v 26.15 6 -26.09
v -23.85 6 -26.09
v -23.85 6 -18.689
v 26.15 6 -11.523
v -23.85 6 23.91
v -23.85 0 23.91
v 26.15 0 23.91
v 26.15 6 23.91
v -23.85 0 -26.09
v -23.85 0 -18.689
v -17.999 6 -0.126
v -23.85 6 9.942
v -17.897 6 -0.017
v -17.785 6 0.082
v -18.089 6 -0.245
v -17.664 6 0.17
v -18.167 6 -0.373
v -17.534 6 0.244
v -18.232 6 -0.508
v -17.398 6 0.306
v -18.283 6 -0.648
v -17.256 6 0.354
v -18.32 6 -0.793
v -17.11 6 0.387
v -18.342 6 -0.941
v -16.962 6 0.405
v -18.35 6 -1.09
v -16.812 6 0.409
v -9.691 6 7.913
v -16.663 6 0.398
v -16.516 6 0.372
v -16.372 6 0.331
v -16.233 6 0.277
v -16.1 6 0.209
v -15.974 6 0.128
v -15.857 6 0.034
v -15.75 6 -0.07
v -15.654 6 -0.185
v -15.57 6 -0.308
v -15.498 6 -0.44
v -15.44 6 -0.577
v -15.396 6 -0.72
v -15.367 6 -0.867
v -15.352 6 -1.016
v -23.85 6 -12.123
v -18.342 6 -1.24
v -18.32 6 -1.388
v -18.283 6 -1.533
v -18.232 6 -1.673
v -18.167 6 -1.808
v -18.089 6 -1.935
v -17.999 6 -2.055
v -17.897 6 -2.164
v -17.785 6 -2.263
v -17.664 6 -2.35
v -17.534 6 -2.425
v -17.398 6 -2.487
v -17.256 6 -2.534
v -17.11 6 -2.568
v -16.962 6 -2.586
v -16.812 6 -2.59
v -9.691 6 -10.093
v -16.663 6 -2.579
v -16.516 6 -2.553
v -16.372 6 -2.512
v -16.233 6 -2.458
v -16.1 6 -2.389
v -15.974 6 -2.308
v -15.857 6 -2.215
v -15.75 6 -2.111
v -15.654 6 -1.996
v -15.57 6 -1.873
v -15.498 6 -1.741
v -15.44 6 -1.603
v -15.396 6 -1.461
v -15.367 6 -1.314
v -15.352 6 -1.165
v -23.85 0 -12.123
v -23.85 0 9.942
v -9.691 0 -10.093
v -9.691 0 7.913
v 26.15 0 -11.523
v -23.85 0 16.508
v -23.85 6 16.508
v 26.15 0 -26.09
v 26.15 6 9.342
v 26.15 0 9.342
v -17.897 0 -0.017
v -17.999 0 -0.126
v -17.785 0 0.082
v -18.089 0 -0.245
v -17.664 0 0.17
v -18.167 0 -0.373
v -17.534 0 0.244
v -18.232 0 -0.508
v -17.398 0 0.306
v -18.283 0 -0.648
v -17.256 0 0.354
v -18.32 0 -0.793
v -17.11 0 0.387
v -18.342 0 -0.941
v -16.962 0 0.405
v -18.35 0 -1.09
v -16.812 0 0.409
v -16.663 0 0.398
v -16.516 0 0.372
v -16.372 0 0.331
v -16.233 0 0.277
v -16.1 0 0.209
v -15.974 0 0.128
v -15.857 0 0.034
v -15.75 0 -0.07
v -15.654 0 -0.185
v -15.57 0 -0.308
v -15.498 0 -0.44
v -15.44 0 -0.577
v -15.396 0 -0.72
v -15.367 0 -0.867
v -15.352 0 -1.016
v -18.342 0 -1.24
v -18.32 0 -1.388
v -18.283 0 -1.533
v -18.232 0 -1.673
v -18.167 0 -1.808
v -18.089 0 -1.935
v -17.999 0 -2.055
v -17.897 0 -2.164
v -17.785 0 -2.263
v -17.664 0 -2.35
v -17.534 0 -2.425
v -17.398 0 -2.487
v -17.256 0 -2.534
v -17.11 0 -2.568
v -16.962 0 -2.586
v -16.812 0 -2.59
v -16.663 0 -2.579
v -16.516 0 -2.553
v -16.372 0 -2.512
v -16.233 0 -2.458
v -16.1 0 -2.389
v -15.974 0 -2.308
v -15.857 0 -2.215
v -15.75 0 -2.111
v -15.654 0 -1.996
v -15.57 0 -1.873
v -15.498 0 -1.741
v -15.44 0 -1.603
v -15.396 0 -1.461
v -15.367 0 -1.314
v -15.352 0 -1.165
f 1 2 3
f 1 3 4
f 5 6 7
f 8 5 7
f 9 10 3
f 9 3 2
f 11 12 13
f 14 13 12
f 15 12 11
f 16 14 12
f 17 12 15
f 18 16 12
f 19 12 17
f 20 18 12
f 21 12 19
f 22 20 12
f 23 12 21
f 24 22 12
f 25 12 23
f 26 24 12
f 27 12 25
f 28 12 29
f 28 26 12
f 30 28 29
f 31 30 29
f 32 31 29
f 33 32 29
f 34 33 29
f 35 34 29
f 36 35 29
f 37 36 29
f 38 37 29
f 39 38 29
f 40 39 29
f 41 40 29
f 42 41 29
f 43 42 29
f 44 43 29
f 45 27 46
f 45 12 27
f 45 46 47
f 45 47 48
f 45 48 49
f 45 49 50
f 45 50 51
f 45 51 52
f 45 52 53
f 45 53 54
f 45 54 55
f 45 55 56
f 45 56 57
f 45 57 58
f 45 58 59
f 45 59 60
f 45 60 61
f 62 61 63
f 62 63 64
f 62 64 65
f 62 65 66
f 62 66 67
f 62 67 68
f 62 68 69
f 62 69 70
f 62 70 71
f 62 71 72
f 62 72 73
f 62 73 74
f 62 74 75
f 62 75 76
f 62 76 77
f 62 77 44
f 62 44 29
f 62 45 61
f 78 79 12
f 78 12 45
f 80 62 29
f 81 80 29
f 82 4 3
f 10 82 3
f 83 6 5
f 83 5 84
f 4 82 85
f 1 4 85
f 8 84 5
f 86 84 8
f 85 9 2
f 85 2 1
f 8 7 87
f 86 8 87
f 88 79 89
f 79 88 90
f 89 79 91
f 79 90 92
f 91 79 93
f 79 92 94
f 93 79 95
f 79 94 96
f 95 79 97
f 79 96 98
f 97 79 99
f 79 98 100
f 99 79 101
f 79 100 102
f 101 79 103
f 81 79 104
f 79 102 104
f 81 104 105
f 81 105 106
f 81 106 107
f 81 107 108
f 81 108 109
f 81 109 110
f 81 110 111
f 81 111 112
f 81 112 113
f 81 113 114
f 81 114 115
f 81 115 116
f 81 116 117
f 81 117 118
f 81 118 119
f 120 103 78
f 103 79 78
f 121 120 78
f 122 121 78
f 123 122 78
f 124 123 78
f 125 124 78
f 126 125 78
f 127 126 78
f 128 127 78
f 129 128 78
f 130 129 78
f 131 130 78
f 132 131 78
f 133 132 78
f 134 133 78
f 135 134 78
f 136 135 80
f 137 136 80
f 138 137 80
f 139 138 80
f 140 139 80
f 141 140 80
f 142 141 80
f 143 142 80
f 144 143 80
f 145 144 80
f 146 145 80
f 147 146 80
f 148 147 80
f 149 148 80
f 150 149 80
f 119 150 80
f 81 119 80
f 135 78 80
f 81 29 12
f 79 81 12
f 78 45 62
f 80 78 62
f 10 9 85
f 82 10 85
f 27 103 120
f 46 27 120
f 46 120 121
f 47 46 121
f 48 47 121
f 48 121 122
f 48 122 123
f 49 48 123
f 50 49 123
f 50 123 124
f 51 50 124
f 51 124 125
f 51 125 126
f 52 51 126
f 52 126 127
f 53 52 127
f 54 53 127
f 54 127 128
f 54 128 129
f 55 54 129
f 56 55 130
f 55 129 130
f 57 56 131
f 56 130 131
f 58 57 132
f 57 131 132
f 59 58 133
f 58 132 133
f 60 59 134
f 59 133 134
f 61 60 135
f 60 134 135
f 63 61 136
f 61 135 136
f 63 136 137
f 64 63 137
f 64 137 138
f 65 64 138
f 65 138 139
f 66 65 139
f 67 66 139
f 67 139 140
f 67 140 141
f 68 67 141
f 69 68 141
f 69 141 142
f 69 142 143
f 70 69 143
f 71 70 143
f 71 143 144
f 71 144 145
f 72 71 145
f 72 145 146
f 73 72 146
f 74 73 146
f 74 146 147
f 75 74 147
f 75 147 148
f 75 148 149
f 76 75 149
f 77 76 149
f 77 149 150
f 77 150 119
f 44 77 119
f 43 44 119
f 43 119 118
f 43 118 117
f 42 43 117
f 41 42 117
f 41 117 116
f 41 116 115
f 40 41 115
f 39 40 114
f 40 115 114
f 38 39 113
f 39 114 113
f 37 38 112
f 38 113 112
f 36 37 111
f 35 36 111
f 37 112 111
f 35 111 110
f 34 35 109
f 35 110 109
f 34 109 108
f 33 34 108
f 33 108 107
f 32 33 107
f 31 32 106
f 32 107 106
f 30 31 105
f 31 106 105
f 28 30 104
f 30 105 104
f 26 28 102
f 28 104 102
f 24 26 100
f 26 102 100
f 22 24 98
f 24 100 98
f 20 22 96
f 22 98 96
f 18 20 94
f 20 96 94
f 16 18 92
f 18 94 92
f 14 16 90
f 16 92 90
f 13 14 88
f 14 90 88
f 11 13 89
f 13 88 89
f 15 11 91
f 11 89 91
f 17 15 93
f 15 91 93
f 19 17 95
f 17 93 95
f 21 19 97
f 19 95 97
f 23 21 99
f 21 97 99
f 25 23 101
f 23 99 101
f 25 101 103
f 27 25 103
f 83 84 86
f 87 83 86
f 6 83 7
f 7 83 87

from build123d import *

# Parameters (mm, degrees)
SKETCH1_W             = 50
SKETCH1_H             = 50
BOSS_EXTRUDE1_DEPTH   = 6
CUT_EXTRUDE1_REACH    = 8
F_3_0MM_DOWEL_HOLE1_D = 3


with BuildPart() as part:
    # Sketch1 → Boss-Extrude1 (new body)
    with BuildSketch(Plane(origin=(0, 0, 0), x_dir=(1, 0, 0), z_dir=(0, 1, 0))):
        with Locations((1.150218805, 1.090402119)):
            Rectangle(SKETCH1_W, SKETCH1_H)
    extrude(amount=BOSS_EXTRUDE1_DEPTH)

    # Sketch2 → Cut-Extrude1 (cut, up to next)
    with BuildSketch(Plane(origin=(0, 6, 0), x_dir=(1, 0, 0), z_dir=(0, 1, 0)), mode=Mode.PRIVATE) as cut_extrude1_sk1:
        Polygon((-23.849781195, 18.689070655), (-23.849781195, 12.122649078), (-9.691499742, 10.093424527), (26.150218805, 4.956438412), (26.150218805, 11.522859989), align=None)
    cut_extrude1_tool1 = extrude(cut_extrude1_sk1.sketch, amount=-CUT_EXTRUDE1_REACH, mode=Mode.PRIVATE) & part.part
    add(cut_extrude1_tool1.solids().sort_by_distance((1.150219, 6, -11.822755))[0], mode=Mode.SUBTRACT)
    # Sketch2 → Cut-Extrude1 (cut, up to next)
    with BuildSketch(Plane(origin=(0, 6, 0), x_dir=(1, 0, 0), z_dir=(0, 1, 0)), mode=Mode.PRIVATE) as cut_extrude1_sk2:
        Polygon((-23.849781195, -9.941844841), (-23.849781195, -16.508266417), (26.150218805, -9.342055751), (26.150218805, -2.775634175), (-9.691499742, -7.91262029), align=None)
    cut_extrude1_tool2 = extrude(cut_extrude1_sk2.sketch, amount=-CUT_EXTRUDE1_REACH, mode=Mode.PRIVATE) & part.part
    add(cut_extrude1_tool2.solids().sort_by_distance((1.150219, 6, 9.64195))[0], mode=Mode.SUBTRACT)
    # Sketch2 → Cut-Extrude1 (cut, up to next)
    with BuildSketch(Plane(origin=(0, 6, 0), x_dir=(1, 0, 0), z_dir=(0, 1, 0)), mode=Mode.PRIVATE) as cut_extrude1_sk3:
        Polygon((-9.691499742, -7.91262029), (26.150218805, -2.775634175), (26.150218805, 4.956438412), (-9.691499742, 10.093424527), align=None)
    cut_extrude1_tool3 = extrude(cut_extrude1_sk3.sketch, amount=-CUT_EXTRUDE1_REACH, mode=Mode.PRIVATE) & part.part
    add(cut_extrude1_tool3.solids().sort_by_distance((5.844849, 6, -1.090402))[0], mode=Mode.SUBTRACT)

    # Ø3.0mm Dowel Hole1 (through all)
    with Locations(Plane(origin=(0, 6, 0), x_dir=(1, 0, 0), z_dir=(0, 1, 0))):
        with Locations((-16.849781195, 1.090402119)):
            Hole(F_3_0MM_DOWEL_HOLE1_D / 2)


solid = part.part
